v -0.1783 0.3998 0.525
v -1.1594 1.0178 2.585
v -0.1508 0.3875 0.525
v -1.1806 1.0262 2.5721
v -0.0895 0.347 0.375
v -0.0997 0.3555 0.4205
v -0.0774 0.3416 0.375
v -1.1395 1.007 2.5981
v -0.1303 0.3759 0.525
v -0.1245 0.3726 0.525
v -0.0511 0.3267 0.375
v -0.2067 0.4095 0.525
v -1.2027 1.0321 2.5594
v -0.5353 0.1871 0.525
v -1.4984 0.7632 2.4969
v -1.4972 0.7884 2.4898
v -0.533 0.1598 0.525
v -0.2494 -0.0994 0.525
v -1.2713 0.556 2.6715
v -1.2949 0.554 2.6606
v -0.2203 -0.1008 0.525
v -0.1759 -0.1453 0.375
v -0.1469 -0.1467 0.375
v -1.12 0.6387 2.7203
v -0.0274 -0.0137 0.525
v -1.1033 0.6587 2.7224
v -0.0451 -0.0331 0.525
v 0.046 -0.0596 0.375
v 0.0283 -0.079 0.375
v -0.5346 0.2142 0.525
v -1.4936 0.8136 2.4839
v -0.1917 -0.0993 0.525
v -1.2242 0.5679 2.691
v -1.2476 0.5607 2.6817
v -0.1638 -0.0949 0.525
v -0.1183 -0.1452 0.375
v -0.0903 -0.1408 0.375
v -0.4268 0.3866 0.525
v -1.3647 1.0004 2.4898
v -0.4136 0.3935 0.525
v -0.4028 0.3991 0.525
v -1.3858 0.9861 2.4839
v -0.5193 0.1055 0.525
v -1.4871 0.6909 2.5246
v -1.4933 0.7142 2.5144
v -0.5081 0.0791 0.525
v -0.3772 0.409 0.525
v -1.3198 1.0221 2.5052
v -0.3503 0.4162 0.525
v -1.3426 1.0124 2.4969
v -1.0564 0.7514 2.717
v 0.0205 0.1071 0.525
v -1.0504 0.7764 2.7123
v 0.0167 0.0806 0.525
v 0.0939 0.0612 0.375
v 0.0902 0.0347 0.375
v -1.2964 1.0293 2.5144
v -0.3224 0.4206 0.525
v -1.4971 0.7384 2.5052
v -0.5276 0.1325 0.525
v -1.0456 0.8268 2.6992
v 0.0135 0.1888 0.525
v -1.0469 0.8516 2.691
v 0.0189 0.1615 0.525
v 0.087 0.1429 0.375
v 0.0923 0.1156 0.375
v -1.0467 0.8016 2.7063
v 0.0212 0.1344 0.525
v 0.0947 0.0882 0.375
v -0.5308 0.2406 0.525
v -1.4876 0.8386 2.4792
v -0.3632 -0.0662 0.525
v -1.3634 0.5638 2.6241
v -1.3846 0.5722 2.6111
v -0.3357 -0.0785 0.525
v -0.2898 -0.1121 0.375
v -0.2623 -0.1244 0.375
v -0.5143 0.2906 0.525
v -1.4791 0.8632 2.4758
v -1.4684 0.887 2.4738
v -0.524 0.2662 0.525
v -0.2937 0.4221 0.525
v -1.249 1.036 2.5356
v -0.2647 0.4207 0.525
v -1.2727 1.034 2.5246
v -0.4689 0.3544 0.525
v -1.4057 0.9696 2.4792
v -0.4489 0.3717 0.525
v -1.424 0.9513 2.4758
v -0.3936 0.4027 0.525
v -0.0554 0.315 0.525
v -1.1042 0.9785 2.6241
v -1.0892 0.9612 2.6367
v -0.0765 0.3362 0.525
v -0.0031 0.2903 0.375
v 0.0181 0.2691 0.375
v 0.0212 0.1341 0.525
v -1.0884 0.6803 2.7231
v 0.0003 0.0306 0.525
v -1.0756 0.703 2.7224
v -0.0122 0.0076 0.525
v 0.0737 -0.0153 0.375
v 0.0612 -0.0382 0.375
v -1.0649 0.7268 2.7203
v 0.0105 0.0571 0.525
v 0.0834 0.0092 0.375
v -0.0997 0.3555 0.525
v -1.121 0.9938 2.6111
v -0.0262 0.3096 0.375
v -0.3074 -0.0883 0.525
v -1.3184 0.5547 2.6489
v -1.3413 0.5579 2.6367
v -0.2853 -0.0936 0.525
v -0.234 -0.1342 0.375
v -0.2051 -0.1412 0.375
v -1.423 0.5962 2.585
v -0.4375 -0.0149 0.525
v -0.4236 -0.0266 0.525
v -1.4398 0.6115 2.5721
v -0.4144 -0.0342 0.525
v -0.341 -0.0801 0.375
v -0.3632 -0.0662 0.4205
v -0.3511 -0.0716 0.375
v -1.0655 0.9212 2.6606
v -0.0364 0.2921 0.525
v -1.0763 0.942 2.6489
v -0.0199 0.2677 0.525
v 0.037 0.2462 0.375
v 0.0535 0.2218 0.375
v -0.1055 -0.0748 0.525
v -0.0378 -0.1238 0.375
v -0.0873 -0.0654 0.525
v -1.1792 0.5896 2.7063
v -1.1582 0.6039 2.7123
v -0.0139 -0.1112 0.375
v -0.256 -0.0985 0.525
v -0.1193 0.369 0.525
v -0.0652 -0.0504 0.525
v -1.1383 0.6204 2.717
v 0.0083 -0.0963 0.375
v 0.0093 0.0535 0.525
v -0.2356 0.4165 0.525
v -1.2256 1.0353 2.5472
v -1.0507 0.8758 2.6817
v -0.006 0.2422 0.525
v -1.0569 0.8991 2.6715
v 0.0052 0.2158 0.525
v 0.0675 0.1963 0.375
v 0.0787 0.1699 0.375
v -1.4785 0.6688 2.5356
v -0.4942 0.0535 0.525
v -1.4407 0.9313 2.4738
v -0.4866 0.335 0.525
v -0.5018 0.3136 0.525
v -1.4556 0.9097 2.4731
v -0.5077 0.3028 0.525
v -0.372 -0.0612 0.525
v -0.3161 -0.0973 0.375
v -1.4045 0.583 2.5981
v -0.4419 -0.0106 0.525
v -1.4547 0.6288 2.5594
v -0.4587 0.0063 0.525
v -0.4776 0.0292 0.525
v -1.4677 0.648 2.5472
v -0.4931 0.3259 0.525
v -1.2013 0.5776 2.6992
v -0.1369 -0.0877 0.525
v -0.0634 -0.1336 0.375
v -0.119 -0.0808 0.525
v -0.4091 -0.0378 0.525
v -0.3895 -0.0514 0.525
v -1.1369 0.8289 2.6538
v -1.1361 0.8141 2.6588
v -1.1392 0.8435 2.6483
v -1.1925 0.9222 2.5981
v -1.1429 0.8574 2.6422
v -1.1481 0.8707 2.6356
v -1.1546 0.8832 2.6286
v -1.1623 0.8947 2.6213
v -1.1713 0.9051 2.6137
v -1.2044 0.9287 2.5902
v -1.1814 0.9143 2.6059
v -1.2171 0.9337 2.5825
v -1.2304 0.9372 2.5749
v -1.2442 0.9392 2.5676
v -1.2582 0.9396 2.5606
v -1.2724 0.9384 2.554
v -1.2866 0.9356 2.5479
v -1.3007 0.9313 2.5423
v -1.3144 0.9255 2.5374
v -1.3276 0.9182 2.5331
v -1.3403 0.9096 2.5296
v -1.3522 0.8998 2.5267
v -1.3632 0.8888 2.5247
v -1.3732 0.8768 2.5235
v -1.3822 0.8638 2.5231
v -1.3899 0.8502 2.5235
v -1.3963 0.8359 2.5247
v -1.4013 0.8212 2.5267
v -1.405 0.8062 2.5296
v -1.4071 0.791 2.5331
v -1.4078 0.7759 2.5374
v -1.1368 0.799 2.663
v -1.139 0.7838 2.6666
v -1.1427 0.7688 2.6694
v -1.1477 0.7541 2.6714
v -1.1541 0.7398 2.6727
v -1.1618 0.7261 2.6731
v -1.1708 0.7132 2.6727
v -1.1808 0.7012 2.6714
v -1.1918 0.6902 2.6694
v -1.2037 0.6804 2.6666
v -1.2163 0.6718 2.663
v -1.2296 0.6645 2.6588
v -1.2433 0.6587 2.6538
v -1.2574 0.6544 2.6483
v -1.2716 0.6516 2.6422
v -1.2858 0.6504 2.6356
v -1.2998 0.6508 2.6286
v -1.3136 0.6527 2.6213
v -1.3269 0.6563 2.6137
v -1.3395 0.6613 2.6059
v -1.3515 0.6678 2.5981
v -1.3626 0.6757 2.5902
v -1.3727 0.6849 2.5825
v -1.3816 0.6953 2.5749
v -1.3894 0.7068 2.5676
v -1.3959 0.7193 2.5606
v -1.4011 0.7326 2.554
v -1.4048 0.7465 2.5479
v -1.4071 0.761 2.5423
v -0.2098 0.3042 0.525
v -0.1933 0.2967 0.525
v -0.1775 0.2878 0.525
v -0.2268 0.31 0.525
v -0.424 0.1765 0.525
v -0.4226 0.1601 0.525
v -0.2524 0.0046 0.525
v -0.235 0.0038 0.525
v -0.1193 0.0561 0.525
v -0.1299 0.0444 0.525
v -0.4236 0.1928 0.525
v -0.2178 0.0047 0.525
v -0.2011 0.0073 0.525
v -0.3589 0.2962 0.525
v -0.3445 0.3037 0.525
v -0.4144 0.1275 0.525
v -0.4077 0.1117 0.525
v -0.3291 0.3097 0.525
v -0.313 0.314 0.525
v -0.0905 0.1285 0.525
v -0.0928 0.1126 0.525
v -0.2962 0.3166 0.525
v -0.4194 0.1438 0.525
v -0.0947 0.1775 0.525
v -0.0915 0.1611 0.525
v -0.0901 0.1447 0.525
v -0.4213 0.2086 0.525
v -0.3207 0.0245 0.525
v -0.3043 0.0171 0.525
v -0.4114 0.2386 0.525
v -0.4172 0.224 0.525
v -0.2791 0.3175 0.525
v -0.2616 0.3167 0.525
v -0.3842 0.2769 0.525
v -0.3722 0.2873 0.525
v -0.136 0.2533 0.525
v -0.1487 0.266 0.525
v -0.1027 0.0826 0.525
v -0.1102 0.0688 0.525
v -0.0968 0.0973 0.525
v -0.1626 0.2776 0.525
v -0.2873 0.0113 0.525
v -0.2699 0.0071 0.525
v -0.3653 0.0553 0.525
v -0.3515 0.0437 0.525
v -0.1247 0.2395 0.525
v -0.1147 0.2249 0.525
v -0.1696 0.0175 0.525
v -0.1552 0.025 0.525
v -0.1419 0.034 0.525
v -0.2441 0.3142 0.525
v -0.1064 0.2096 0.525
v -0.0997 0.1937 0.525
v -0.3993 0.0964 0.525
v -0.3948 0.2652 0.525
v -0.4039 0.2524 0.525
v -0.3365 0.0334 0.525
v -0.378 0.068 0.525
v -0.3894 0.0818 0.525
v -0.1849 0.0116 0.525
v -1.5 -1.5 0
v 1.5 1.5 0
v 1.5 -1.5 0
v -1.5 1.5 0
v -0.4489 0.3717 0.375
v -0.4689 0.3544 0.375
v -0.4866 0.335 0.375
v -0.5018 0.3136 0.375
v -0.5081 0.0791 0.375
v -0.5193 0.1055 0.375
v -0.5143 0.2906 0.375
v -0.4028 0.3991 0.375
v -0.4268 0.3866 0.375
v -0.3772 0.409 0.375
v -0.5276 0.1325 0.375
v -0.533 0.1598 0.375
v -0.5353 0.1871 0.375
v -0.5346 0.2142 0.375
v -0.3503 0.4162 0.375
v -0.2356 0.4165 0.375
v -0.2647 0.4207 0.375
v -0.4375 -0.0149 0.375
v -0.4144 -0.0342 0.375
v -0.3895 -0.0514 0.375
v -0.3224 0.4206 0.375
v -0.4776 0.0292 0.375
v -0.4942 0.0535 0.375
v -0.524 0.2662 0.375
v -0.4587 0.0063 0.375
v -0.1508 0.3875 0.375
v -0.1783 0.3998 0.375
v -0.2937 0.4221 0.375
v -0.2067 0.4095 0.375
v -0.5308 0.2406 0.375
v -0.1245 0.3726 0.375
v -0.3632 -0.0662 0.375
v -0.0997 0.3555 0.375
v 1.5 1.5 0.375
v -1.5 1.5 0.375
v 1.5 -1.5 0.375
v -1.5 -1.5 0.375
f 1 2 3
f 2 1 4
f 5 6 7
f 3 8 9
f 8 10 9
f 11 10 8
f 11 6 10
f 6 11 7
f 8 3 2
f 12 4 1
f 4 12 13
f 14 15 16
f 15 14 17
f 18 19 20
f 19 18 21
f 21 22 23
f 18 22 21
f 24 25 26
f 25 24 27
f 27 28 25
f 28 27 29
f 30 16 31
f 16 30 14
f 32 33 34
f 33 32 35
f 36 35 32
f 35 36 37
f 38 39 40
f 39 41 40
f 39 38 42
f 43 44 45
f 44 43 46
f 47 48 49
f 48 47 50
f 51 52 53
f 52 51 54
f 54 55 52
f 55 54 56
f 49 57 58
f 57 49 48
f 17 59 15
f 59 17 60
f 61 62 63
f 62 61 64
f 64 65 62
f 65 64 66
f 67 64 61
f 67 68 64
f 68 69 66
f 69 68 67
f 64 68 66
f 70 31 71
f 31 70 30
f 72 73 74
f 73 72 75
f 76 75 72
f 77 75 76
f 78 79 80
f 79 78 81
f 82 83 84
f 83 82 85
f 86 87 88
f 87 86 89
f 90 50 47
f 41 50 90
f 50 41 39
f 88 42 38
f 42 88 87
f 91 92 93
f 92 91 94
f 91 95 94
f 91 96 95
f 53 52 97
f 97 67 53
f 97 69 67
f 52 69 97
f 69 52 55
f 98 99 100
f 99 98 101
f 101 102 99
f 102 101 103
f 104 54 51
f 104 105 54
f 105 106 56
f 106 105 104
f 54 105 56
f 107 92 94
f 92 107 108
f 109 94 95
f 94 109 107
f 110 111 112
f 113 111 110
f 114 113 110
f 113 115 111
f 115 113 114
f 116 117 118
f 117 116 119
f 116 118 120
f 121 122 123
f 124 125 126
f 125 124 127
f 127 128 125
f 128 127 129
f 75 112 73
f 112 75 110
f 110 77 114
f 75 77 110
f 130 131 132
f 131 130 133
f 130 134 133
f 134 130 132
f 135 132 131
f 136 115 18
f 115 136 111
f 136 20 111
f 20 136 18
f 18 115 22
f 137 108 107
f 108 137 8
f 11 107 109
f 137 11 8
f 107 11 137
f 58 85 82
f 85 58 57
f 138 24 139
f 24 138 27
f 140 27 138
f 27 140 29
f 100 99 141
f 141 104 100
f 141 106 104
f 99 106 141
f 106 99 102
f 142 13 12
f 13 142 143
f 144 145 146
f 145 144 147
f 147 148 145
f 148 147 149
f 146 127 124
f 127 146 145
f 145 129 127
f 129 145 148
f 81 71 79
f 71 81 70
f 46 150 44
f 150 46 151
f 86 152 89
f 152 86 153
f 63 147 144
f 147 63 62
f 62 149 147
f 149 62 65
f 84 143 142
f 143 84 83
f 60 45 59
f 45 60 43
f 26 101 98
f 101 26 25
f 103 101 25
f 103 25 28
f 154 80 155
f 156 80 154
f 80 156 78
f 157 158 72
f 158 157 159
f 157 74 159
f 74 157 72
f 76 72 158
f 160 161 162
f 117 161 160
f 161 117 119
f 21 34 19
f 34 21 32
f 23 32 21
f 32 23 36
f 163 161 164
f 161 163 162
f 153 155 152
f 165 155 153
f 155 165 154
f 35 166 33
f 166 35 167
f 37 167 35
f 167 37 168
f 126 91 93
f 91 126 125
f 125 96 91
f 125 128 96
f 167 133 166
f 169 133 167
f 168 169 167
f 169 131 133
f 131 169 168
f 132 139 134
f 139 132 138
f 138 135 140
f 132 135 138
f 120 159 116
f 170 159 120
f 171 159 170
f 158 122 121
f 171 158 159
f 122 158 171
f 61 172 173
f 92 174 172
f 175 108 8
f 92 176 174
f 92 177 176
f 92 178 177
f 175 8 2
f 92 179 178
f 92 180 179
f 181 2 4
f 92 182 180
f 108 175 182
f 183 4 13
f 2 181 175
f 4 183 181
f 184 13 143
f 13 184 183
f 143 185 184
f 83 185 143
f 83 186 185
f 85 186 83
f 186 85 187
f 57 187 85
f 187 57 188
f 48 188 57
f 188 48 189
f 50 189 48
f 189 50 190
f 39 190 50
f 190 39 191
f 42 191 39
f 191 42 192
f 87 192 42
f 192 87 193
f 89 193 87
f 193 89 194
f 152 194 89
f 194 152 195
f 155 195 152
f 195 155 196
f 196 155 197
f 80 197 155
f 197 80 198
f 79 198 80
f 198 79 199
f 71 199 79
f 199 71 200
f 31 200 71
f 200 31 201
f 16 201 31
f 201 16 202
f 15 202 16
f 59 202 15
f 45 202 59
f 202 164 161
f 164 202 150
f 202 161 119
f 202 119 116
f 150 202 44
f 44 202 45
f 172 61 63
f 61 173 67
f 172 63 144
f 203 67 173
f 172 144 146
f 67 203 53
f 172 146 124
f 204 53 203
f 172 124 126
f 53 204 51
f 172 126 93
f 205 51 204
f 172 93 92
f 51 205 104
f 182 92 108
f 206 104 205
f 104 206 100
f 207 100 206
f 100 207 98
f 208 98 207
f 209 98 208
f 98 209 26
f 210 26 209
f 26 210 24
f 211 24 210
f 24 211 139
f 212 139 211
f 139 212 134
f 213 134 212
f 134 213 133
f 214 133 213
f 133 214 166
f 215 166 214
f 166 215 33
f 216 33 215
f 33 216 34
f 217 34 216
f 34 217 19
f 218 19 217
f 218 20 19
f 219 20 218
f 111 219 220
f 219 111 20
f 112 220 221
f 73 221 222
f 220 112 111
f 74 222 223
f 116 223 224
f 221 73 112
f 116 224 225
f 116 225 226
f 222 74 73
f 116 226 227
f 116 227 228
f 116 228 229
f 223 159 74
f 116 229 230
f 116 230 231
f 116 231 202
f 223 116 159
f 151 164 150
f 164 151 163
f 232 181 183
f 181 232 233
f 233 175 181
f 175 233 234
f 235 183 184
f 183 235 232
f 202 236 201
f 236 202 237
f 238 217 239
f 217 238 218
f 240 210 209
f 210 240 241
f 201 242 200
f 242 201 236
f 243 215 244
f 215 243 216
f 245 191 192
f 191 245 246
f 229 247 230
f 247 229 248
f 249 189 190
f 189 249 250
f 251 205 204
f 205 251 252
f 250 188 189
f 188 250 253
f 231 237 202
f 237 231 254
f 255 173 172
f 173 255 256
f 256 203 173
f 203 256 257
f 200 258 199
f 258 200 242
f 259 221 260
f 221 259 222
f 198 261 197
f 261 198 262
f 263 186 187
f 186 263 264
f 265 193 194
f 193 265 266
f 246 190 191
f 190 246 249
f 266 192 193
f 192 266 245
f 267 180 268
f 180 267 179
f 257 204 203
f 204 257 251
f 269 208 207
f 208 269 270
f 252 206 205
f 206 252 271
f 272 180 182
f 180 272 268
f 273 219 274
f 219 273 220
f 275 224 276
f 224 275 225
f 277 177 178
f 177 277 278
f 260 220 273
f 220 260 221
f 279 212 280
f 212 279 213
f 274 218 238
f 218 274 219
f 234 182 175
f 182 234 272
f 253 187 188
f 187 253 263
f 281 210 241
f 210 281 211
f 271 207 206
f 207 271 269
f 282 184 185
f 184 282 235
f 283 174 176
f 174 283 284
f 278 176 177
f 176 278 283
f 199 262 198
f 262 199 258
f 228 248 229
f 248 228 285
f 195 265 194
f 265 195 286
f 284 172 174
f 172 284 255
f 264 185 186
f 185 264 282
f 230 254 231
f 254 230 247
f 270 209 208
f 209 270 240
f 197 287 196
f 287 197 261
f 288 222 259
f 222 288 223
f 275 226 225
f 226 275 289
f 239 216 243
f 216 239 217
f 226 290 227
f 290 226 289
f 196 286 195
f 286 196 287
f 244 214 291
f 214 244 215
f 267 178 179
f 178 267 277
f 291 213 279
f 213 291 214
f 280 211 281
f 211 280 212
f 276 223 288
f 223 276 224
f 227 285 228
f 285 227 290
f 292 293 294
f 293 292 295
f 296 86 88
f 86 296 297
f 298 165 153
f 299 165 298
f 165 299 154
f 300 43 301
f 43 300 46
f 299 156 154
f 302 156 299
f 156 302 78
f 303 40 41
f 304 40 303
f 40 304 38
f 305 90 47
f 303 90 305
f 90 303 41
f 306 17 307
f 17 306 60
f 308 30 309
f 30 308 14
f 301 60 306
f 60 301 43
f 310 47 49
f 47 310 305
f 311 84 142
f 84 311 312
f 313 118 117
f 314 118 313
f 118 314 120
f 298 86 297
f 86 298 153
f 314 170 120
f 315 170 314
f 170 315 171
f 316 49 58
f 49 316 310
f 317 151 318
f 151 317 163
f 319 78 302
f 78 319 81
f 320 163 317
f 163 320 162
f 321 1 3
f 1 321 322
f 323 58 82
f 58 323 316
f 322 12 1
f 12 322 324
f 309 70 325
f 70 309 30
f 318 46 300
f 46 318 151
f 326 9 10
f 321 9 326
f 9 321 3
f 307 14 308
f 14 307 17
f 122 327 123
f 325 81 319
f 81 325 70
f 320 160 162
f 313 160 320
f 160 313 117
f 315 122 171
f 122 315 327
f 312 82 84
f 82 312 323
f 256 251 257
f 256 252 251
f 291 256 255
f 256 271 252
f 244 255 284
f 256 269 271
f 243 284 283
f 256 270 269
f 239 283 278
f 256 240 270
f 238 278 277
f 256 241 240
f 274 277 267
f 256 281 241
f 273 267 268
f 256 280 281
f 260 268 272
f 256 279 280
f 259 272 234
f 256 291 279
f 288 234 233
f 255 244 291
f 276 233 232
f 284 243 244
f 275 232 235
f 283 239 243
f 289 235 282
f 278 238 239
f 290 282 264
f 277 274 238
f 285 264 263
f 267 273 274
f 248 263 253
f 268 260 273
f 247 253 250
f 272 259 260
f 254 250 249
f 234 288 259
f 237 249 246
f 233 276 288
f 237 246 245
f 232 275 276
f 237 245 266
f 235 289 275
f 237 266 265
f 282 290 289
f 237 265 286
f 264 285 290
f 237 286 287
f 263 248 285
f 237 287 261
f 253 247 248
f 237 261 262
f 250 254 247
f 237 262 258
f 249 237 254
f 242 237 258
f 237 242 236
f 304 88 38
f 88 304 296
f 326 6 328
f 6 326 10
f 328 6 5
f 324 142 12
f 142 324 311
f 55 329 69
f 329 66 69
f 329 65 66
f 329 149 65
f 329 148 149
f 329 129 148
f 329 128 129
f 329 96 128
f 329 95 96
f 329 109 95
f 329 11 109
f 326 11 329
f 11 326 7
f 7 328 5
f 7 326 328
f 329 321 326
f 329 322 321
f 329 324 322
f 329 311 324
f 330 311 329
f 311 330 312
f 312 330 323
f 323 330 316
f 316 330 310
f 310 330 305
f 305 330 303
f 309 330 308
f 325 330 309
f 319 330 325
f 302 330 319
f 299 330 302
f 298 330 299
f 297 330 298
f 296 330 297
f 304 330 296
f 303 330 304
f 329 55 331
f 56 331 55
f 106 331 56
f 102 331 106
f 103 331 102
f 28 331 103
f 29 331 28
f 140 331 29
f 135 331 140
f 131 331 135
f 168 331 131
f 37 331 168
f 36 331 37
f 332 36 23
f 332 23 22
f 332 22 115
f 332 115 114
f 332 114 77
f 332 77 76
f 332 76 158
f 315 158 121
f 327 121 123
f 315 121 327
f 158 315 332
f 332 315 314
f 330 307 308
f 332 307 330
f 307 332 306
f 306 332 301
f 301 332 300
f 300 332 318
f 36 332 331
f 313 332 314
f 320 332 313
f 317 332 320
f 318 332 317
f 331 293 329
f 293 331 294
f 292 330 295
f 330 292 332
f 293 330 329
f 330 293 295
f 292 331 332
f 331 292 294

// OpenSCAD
$fn = 60;
eps = 0.01;
corner_base_h = 3;
corner_base_thickness = 0.375;

pole_mount_id = 0.3;
pole_mount_od =.5;
pole_mount_h = 3;

theta = 60;
phi = atan(48/30);

fillet_r = 0.1;
fillet_y =  fillet_r/tan(theta)
    +(pole_mount_od/2)/sin(theta)
    +fillet_r/sin(theta);
fillet_z = fillet_r*(1+cos(theta));
echo ("fillet_y = ", fillet_y);
echo ("fillet_z = ", fillet_z);

//intersection()
//{
//translate([0,corner_base_thickness/tan(theta), corner_base_thickness])
//difference() {
//  translate([-pole_mount_od/2,
//             0,
//             0])
//    cube([pole_mount_od,
//          fillet_y,
//          fillet_z],
//         center = false );
//    
//  // A subtraction for the back corners of the fillet block
//  //  which would otherwise extend from the back of the mount
//  // cylinder
//  rotate([-90+theta, 0,  phi])
//    translate([-pole_mount_od/2, -pole_mount_od/2,  0])
//      cube([pole_mount_od, pole_mount_od/2, fillet_z/sin(theta)]);
//
//  // The fillet to be subtracted out
//  translate([pole_mount_od/2,  fillet_y , fillet_r])
//    rotate([0,-90,0])
//      cylinder(h=pole_mount_od, r=fillet_r, center = false);
//    
//
//}

module stress_collar(){
color("lightblue")
    translate ([0,corner_base_thickness/tan(theta),.0+corner_base_thickness])
      linear_extrude(height = fillet_z, 
                center = false, convexity = 10, slices = 20 )
        hull() {
//          scale([1,1/sin(theta),1])
//            circle(d=pole_mount_od);
          translate([0,fillet_z/tan(theta),0])
            scale([1,1/sin(theta),1])
              circle(d=pole_mount_od);
        
        }
    }

rotate([0,0,phi]) stress_collar();
    {
      translate([-corner_base_h/2, -corner_base_h/2, 0])
        cube([corner_base_h, corner_base_h, corner_base_thickness], center = false);

      difference() {
        rotate([-90+theta, 0, phi])
          difference() 
        {
            cylinder(h=pole_mount_h, d=pole_mount_od, center=false, $fn=60);
            cylinder(h=pole_mount_h, d=pole_mount_id, center=false, $fn=60);
          }
        translate([-corner_base_h/2, -corner_base_h/2, -corner_base_thickness])
          cube([corner_base_h, corner_base_h, corner_base_thickness], center = false);
      }
    }
